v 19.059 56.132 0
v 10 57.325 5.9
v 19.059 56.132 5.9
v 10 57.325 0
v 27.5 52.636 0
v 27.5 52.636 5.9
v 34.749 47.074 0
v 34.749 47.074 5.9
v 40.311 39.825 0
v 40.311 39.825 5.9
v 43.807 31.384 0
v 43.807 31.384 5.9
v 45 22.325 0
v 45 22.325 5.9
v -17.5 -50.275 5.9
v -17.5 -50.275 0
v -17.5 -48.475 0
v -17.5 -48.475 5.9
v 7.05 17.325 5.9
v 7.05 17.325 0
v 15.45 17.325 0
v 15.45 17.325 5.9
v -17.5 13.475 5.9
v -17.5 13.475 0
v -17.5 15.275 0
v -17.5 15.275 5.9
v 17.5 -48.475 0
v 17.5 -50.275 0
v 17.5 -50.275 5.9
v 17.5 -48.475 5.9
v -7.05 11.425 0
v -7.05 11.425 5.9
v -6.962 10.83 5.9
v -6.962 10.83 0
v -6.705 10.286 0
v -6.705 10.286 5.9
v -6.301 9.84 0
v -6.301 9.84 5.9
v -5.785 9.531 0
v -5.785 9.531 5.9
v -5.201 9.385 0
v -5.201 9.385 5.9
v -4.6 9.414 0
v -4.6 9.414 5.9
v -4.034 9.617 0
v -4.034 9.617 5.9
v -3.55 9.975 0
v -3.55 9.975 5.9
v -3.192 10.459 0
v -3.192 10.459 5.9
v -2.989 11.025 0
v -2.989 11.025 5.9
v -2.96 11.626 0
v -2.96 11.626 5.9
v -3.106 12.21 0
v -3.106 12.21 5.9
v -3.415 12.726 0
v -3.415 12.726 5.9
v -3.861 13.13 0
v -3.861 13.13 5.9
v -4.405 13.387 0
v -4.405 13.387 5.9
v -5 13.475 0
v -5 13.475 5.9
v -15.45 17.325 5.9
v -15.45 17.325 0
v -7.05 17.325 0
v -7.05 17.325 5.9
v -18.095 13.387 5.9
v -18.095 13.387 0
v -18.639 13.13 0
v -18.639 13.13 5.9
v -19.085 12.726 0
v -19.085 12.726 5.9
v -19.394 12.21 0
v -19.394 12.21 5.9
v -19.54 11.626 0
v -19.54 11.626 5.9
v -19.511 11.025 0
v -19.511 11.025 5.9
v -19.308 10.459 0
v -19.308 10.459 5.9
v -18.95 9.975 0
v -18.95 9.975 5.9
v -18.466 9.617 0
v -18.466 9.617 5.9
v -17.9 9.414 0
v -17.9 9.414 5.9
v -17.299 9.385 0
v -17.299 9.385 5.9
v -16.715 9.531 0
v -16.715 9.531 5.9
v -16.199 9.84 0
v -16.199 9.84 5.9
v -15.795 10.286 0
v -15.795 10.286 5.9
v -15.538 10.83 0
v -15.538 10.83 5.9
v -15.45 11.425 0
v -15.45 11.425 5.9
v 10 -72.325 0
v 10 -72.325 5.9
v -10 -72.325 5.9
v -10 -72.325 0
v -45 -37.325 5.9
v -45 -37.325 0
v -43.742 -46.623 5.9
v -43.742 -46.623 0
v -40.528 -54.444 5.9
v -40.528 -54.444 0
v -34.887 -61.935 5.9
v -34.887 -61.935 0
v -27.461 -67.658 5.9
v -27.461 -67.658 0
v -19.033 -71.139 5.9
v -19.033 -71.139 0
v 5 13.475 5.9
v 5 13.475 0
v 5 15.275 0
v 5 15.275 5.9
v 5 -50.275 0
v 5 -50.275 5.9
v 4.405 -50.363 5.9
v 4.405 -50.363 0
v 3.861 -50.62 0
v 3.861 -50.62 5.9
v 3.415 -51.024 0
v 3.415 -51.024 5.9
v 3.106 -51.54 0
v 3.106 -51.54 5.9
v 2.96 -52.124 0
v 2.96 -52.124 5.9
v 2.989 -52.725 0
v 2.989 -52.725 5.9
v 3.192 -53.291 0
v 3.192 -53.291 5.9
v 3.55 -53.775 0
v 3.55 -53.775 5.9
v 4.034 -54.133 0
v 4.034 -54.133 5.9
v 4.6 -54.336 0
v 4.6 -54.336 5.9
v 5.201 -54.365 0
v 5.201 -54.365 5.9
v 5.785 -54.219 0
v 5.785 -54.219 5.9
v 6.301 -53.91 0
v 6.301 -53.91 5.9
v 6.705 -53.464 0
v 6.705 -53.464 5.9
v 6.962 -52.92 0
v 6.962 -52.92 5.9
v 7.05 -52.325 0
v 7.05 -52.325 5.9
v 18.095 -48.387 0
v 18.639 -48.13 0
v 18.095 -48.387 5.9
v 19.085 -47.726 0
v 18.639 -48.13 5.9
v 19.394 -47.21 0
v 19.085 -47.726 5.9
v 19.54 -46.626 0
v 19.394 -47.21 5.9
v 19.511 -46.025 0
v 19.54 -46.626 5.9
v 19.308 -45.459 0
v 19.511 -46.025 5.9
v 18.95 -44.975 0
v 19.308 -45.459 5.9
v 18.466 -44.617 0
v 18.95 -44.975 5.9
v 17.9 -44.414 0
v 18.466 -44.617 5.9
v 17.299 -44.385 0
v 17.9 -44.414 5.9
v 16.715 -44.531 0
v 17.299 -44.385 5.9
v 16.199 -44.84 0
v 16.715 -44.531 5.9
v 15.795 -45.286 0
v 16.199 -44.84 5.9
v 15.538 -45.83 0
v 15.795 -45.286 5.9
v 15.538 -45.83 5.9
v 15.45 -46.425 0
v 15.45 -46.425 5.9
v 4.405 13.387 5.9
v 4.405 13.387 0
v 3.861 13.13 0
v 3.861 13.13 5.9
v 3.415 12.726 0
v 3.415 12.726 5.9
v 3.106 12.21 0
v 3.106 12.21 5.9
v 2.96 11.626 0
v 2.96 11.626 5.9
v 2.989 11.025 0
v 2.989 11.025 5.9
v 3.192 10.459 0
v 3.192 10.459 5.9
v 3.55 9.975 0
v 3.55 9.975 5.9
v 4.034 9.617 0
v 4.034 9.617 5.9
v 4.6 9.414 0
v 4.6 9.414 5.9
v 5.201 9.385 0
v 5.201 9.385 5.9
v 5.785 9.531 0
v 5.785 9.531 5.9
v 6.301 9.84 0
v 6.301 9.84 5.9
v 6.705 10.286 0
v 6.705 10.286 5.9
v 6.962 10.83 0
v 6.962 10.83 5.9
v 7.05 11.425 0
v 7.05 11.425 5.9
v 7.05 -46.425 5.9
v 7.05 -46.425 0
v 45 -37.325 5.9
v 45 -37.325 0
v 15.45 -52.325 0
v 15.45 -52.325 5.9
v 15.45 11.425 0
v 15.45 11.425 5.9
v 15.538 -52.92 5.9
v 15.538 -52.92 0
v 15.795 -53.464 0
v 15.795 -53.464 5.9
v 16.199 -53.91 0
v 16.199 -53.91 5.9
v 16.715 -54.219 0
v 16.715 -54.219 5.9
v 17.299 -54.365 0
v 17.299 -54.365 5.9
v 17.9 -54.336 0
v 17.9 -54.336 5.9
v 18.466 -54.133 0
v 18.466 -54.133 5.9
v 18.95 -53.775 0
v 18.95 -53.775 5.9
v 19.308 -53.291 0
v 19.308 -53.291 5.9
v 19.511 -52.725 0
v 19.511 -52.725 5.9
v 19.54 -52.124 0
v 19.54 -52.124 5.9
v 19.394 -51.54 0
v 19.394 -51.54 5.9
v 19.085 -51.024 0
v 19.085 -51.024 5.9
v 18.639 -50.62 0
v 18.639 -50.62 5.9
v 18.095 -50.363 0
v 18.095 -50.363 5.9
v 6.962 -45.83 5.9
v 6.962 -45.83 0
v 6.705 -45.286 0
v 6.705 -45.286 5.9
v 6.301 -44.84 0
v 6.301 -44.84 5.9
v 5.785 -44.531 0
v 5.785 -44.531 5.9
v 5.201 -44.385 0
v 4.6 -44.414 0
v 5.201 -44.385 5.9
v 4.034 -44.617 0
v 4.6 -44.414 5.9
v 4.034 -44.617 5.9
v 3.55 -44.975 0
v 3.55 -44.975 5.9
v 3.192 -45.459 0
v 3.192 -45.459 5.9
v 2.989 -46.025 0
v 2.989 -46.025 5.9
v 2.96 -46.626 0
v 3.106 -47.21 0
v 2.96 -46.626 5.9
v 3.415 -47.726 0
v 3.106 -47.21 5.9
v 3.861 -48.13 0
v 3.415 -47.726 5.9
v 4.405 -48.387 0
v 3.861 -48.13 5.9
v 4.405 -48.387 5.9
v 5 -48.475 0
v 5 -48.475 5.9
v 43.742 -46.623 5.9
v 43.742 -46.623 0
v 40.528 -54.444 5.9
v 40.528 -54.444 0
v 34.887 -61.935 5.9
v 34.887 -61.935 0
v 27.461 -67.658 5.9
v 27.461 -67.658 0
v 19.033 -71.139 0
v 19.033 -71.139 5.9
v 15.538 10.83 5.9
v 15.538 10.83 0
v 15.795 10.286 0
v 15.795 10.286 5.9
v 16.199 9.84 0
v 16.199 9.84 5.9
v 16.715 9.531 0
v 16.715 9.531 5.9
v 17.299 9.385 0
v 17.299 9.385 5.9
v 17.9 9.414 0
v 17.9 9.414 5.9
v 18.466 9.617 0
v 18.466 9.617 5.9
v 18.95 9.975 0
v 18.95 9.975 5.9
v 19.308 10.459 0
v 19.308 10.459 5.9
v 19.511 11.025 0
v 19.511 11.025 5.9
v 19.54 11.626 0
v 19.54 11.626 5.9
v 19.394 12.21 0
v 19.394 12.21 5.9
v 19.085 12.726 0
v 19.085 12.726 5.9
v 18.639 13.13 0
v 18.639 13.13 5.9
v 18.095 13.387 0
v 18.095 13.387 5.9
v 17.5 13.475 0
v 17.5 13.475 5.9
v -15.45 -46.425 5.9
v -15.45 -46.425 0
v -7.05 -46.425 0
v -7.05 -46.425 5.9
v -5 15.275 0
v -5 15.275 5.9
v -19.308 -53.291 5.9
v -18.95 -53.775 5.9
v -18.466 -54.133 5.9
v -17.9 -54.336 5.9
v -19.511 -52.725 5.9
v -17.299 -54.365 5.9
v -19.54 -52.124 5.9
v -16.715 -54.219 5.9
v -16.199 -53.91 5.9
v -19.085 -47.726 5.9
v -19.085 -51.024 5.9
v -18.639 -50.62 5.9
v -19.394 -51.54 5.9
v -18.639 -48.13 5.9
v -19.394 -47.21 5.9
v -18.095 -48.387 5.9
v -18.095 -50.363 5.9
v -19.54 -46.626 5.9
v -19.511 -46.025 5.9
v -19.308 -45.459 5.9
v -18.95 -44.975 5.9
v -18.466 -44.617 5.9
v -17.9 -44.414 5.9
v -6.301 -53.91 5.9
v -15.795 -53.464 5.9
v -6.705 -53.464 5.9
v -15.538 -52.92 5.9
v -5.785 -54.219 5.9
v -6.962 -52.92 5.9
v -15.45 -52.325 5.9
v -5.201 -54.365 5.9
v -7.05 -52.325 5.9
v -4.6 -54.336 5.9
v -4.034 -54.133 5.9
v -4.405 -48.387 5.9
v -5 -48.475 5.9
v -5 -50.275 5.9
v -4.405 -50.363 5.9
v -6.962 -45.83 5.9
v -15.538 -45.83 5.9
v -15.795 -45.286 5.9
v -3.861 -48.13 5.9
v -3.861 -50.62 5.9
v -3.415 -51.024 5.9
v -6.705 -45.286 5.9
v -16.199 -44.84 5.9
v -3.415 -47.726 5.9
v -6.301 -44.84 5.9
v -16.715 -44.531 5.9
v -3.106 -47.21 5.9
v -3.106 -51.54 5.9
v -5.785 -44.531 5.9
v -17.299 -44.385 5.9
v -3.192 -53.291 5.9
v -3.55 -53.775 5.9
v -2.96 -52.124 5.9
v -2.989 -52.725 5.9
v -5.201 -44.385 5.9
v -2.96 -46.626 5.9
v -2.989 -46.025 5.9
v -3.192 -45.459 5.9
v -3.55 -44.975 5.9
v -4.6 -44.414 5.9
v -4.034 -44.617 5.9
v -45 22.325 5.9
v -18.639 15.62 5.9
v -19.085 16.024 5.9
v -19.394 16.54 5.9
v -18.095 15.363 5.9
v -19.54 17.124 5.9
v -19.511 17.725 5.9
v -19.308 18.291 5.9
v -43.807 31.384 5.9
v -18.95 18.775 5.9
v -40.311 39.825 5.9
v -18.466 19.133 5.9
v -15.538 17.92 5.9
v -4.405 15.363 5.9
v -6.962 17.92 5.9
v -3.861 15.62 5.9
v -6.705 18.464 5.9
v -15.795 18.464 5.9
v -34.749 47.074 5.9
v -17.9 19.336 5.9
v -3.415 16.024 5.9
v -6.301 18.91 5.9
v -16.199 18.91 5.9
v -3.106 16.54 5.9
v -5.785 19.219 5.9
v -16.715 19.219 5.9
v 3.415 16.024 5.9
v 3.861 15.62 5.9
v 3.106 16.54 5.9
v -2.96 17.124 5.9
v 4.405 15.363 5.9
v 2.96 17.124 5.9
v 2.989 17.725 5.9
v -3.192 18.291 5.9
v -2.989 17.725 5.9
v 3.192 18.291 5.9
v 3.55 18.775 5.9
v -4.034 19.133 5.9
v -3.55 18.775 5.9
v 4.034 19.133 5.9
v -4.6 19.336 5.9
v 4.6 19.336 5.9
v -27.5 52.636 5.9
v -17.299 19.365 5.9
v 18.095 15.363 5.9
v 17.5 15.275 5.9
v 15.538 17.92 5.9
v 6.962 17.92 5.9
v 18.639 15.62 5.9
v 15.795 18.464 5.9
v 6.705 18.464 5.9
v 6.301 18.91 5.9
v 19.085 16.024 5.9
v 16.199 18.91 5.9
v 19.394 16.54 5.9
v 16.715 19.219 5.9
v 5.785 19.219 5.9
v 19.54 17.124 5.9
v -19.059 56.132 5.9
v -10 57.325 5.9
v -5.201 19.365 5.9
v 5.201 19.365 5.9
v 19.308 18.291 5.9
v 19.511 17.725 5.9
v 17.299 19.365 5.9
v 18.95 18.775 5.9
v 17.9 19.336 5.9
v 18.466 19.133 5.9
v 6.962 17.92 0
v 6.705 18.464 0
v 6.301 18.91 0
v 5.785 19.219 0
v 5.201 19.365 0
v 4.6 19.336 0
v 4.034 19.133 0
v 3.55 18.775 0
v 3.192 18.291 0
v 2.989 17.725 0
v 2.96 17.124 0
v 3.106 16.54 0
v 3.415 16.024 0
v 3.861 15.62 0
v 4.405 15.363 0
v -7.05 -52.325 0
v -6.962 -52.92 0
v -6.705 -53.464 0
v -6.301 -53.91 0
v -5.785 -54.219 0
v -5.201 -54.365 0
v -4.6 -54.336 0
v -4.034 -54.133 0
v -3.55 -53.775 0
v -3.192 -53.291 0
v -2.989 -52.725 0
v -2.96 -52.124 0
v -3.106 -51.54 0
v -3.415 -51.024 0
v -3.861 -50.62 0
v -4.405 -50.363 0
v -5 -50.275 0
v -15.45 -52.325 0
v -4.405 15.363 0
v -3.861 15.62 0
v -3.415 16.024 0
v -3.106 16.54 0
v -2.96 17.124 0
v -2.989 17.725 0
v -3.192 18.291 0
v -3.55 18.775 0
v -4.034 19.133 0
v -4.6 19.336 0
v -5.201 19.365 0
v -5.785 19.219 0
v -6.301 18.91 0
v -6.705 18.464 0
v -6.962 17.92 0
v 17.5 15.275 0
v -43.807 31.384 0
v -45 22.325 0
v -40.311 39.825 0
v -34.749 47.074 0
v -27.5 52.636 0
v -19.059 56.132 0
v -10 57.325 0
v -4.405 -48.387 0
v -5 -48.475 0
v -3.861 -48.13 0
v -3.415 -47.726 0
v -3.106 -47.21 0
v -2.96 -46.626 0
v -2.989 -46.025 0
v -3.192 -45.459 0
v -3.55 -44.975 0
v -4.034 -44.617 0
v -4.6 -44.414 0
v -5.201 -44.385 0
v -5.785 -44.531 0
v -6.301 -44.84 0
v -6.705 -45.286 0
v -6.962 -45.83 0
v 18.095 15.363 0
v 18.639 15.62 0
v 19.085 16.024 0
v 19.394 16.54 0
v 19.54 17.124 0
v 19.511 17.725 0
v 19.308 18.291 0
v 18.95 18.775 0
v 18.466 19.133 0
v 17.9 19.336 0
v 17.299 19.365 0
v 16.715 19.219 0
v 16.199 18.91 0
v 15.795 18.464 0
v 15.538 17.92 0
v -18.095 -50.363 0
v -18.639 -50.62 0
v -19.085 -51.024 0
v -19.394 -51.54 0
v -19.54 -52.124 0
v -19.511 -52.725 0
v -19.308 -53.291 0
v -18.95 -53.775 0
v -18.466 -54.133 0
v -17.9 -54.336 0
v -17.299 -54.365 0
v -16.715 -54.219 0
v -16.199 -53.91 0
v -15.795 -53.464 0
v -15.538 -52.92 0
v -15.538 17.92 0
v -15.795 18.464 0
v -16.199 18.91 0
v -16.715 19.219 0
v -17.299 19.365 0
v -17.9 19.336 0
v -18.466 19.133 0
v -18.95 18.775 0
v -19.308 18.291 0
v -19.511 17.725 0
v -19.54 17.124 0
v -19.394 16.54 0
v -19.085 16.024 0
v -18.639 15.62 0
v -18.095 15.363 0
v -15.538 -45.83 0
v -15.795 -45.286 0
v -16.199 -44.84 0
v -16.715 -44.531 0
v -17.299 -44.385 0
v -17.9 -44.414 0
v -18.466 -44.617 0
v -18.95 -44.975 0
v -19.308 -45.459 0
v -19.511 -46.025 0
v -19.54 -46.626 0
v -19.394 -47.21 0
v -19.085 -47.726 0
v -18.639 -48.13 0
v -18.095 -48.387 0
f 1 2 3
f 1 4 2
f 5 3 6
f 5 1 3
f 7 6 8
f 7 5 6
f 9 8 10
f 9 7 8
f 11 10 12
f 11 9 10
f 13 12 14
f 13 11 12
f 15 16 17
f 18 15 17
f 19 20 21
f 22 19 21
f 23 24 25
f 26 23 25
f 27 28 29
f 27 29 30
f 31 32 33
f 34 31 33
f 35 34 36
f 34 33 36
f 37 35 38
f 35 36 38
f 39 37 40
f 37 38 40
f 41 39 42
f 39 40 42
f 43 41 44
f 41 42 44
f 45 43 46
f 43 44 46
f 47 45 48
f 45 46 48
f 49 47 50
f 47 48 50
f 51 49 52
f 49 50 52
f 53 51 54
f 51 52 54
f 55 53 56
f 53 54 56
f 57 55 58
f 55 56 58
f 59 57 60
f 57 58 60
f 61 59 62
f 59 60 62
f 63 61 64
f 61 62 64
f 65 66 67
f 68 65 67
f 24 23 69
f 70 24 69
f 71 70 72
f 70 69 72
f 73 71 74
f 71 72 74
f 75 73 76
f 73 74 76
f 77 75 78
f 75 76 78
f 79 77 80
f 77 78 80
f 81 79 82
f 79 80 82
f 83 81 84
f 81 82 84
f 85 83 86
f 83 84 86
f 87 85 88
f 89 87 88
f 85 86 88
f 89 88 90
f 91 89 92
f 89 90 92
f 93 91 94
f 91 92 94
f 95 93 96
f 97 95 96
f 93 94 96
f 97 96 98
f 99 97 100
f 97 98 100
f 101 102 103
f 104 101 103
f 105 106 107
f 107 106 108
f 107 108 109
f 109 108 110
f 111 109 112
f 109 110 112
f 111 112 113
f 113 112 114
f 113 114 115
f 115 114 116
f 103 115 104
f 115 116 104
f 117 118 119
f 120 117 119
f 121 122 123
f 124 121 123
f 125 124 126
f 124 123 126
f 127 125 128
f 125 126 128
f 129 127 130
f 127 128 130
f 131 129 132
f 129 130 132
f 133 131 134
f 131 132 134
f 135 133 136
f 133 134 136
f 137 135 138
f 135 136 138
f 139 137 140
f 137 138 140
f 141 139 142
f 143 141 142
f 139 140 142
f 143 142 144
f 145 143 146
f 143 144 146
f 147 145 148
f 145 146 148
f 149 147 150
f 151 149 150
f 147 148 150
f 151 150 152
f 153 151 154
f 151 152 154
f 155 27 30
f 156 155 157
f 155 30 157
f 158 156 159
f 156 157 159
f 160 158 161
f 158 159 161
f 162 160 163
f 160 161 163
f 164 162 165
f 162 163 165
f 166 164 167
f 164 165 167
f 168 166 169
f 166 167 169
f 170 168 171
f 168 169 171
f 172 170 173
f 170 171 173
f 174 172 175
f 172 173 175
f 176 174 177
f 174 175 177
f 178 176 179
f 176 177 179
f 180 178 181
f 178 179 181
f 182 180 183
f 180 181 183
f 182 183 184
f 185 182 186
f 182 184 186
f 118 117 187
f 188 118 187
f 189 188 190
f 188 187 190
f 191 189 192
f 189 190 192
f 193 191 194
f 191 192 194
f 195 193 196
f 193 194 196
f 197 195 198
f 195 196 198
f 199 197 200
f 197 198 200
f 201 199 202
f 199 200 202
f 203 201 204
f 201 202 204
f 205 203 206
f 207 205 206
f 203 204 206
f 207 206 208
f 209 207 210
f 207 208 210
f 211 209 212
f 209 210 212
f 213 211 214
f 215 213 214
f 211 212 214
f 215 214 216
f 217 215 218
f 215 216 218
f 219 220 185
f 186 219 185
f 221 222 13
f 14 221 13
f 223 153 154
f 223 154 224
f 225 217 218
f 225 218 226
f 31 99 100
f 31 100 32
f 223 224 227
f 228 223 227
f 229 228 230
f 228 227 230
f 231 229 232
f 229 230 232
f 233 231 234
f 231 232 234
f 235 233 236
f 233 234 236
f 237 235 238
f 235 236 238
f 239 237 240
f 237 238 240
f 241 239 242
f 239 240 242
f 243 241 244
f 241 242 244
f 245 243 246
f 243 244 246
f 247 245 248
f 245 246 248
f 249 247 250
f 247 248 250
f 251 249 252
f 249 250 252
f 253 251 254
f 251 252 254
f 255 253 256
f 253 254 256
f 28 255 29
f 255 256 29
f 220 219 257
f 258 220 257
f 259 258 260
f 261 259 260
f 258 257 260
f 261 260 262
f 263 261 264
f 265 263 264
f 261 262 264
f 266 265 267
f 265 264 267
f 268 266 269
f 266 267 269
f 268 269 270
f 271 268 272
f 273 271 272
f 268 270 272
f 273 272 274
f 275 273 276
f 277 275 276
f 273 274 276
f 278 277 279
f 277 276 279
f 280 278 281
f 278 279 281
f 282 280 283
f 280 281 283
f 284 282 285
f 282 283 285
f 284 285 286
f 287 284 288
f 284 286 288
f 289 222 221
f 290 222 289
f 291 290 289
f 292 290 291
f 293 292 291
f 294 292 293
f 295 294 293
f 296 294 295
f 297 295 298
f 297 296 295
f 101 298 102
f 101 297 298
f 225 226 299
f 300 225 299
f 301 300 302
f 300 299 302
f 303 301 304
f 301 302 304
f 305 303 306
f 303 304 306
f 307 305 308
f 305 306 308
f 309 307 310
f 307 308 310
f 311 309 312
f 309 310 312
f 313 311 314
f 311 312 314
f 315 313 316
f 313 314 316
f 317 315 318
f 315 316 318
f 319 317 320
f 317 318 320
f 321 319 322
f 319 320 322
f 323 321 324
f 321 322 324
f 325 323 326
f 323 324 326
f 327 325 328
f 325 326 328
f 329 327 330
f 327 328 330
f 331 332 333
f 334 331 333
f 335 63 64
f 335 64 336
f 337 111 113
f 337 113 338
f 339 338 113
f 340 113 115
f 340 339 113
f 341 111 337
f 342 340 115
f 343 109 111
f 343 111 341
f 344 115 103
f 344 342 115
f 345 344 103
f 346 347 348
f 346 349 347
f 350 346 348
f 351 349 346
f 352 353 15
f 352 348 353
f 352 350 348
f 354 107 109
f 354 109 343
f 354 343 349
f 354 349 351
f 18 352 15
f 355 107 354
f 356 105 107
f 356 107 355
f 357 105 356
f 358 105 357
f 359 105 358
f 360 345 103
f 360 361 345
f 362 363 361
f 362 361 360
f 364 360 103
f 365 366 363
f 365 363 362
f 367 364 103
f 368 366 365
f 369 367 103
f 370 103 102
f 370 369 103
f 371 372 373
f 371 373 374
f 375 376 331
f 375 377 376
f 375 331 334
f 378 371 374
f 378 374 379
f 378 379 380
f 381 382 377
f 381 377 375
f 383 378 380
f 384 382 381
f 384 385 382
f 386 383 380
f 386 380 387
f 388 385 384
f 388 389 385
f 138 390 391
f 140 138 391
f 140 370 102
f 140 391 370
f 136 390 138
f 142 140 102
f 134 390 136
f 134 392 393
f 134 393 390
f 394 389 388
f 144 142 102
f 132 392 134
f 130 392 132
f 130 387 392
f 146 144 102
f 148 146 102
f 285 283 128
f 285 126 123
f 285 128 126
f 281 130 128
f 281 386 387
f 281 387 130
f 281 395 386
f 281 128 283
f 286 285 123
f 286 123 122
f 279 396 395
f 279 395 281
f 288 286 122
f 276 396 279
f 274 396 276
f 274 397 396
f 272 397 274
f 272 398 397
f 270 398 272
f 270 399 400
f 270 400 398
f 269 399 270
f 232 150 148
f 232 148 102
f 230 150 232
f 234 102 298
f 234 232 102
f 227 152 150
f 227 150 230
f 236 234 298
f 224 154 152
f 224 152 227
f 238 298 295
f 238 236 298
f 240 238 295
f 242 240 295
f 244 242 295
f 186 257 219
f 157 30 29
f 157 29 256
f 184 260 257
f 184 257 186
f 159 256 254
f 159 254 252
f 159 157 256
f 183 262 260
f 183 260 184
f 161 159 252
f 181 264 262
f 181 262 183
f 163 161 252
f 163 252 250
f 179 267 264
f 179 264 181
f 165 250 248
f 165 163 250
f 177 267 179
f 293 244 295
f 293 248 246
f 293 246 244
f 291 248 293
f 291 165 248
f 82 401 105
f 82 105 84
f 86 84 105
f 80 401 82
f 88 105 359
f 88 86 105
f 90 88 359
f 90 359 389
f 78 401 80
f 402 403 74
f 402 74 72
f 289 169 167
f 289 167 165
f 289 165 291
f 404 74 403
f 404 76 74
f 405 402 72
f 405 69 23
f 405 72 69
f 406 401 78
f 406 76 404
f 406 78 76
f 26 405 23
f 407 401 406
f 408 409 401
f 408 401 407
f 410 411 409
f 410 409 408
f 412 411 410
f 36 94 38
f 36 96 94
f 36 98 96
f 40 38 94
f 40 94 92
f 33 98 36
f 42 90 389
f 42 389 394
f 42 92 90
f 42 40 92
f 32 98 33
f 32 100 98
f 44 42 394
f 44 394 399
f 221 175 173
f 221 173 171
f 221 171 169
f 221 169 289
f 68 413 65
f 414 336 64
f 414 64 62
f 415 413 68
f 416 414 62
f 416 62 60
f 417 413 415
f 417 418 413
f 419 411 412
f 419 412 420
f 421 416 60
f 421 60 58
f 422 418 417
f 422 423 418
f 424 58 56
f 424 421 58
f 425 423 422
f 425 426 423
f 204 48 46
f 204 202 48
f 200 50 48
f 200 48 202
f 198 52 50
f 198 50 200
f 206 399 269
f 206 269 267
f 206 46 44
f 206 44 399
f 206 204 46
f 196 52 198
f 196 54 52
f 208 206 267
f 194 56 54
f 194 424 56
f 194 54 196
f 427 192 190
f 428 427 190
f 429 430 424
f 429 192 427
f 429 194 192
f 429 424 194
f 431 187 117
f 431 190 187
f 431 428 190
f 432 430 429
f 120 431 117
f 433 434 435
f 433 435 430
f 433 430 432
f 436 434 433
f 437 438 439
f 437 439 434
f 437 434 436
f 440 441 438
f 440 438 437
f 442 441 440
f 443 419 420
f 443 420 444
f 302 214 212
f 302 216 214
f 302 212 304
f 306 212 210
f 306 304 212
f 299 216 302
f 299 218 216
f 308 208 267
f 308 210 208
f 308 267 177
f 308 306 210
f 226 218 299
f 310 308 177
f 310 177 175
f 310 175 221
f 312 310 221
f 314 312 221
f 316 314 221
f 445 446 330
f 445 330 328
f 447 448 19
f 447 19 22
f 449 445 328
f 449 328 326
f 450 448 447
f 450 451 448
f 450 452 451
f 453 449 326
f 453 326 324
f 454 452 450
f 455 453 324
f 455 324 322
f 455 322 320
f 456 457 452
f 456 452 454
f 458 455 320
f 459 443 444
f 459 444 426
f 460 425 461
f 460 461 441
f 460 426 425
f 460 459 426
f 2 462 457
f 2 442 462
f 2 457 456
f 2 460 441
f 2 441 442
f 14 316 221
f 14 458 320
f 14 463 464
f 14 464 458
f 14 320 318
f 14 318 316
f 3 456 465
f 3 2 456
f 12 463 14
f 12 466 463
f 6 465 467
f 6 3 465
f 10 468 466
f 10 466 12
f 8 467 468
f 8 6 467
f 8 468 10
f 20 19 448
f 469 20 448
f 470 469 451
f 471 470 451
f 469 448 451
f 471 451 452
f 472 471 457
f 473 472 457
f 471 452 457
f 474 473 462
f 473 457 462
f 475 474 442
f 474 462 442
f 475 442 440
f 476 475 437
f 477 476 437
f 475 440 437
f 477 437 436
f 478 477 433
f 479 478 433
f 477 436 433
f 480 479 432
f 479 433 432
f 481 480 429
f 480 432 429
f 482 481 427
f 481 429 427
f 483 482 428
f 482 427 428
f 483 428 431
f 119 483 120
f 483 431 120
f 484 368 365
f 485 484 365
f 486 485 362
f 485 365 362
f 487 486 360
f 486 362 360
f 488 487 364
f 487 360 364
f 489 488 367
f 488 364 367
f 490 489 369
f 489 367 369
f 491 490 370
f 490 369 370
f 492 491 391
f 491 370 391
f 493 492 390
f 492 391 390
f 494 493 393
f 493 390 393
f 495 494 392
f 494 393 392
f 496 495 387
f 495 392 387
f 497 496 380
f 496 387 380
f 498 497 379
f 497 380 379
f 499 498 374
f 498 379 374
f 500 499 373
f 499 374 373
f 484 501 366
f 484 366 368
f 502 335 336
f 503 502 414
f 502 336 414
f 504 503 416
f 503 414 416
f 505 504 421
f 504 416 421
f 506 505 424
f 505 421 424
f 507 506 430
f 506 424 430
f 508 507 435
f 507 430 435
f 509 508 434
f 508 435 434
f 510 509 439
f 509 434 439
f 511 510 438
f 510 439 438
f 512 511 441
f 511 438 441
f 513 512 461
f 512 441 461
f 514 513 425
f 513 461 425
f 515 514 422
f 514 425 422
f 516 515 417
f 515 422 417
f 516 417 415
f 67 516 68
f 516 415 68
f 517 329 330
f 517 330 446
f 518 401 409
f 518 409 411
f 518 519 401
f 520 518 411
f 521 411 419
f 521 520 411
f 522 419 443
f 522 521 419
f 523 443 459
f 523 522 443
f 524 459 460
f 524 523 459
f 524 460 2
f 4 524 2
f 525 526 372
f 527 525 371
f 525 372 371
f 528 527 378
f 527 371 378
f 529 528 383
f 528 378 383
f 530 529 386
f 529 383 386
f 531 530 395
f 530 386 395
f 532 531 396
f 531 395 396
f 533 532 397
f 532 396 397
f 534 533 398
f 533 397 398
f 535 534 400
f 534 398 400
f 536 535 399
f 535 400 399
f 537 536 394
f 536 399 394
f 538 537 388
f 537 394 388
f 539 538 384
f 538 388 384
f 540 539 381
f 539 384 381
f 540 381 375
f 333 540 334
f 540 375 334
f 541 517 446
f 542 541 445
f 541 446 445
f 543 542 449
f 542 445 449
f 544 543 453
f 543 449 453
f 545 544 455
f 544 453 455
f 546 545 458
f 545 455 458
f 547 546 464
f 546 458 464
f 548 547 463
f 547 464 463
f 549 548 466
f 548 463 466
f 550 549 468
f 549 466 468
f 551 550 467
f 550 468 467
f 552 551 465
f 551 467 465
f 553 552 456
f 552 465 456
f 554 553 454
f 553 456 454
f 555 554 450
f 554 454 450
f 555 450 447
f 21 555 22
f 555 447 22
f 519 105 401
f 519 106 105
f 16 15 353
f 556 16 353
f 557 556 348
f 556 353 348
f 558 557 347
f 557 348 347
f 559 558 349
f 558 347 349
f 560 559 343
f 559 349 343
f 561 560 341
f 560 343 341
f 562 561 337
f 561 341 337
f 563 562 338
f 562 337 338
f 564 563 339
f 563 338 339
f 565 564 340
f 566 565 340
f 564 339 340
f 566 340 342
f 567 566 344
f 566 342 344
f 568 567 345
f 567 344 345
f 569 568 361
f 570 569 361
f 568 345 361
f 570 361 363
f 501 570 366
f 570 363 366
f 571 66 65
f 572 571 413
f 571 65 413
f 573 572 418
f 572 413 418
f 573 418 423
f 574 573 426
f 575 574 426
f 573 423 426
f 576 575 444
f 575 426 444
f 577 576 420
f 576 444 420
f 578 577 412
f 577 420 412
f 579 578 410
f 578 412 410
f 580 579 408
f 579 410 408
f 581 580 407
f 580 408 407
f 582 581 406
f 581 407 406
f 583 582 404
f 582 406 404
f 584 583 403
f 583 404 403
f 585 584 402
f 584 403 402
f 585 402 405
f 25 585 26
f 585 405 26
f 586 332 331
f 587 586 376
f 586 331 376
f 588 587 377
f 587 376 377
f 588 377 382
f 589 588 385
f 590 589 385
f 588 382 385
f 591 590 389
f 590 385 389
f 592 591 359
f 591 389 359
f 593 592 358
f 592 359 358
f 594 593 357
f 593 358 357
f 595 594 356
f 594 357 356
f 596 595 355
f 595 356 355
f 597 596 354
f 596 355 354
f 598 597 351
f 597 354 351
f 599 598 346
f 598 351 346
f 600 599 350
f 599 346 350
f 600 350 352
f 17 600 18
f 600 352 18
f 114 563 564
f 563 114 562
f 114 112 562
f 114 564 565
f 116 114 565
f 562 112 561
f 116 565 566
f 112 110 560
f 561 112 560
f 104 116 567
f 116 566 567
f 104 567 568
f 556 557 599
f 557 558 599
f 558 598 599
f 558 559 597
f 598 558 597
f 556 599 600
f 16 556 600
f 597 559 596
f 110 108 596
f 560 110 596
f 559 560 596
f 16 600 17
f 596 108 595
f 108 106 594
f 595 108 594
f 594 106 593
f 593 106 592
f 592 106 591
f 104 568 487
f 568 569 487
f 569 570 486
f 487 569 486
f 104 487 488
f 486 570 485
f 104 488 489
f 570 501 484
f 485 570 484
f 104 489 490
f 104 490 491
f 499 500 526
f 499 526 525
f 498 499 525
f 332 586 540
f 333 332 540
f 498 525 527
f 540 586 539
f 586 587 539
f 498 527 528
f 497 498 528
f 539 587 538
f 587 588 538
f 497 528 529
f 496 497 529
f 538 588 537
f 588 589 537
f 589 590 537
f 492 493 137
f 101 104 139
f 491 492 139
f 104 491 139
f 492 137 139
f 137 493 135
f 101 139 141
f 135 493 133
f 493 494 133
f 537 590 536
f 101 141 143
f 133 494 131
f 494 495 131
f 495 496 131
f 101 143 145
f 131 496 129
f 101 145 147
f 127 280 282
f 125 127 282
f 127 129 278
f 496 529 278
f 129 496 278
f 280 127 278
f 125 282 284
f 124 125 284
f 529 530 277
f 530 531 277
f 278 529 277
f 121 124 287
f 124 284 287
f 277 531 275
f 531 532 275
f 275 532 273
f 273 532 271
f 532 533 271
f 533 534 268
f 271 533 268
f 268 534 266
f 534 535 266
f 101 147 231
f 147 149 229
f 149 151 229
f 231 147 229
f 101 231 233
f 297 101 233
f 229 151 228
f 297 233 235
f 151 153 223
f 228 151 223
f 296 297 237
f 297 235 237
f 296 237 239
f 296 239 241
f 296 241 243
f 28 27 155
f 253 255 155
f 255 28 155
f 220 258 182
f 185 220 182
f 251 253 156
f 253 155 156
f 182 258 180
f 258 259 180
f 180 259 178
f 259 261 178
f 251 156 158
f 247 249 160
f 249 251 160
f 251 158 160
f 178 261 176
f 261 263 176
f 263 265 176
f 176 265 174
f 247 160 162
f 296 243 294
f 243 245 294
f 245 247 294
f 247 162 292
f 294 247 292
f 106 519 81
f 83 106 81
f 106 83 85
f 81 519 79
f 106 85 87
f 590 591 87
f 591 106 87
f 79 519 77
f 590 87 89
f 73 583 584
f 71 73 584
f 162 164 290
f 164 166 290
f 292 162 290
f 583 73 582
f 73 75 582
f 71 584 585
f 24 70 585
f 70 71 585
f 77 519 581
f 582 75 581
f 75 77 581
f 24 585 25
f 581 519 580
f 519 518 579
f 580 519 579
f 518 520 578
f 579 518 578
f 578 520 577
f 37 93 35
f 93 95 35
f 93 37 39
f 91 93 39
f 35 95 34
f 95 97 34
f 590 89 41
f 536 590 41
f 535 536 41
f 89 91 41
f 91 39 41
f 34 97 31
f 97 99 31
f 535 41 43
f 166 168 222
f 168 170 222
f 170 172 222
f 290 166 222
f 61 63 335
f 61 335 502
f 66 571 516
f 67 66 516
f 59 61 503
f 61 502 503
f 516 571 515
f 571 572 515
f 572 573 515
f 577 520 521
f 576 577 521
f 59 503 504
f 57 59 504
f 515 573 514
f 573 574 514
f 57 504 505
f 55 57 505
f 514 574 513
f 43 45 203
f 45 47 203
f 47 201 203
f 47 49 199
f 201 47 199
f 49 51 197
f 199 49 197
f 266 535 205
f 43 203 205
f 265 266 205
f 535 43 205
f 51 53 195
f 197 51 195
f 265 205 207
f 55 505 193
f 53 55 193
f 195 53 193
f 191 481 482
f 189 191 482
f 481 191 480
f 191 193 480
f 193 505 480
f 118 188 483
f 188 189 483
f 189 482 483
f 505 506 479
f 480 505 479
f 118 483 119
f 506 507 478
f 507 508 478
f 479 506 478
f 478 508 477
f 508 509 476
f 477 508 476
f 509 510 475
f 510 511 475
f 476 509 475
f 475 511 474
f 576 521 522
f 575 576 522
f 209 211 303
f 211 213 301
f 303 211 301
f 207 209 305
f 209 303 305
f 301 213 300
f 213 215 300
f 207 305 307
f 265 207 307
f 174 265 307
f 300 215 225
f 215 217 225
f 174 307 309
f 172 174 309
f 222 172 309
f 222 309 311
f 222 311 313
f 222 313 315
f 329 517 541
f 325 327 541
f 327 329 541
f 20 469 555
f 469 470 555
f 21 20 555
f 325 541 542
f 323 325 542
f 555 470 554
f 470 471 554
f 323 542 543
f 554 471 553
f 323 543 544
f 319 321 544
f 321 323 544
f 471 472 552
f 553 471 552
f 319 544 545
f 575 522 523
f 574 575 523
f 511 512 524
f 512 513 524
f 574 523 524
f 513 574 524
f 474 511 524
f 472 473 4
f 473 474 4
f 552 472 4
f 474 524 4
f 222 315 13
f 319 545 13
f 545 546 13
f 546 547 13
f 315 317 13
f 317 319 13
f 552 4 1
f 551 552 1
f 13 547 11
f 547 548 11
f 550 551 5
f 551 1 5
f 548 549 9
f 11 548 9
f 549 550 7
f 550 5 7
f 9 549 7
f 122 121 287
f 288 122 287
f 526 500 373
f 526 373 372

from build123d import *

# Parameters (mm, degrees)
SKETCH1_W           = 90
SKETCH1_H           = 154.65
SKETCH1_W_2         = 12.5
SKETCH1_H_2         = 5.9
BOSS_EXTRUDE1_DEPTH = 5.9
FILLET2_R           = 10
BOSS_EXTRUDE2_DEPTH = 5.9
CUT_EXTRUDE1_REACH  = 7.9
SKETCH5_R           = 2.05
CUT_EXTRUDE4_REACH  = 7.9
FILLET3_R           = 35


with BuildPart() as part:
    # Sketch1 → Boss-Extrude1 (new body)
    with BuildSketch(Plane.XY):
        Rectangle(SKETCH1_W, SKETCH1_H)
        with Locations((-11.25, 14.375)):
            Rectangle(SKETCH1_W_2, SKETCH1_H_2, mode=Mode.SUBTRACT)
        with Locations((11.25, 14.375)):
            Rectangle(SKETCH1_W_2, SKETCH1_H_2, mode=Mode.SUBTRACT)
        with Locations((11.25, -49.375)):
            Rectangle(SKETCH1_W_2, SKETCH1_H_2, mode=Mode.SUBTRACT)
        with Locations((-11.25, -49.375)):
            Rectangle(SKETCH1_W_2, SKETCH1_H_2, mode=Mode.SUBTRACT)
    extrude(amount=BOSS_EXTRUDE1_DEPTH)

    # Fillet2
    fillet2_edges = [part.edges().sort_by_distance(p)[0] for p in [
        (45, -77.325, 2.95),
        (-45, -77.325, 2.95),
        (-45, 77.325, 2.95),
        (45, 77.325, 2.95),
    ]]
    fillet(fillet2_edges, radius=FILLET2_R)

    # Sketch2 → Boss-Extrude2 (add)
    with BuildSketch(Plane.XY.offset(5.9)):
        Polygon((24.6, -77.325), (-24.6, -77.325), (-10, -90.939292058), (-10, -103.239292058), (-4.5, -119.325), (4.5, -119.325), (10, -103.239292058), (10, -90.939292058), align=None)
        with BuildLine():
            Line((-45, 67.325), (-45, 53.482347581))
            Line((-45, 53.482347581), (0, 77.325))
            ThreePointArc((0, 77.325), (-4.9039074, 78.609973195), (-8.547536888, 82.134661558))
            Line((-8.547536888, 82.134661558), (-15.653395136, 93.836708769))
            Line((-15.653395136, 93.836708769), (-36.605205168, 117.74389141))
            Line((-36.605205168, 117.74389141), (-44.297988367, 113.072586812))
            Line((-44.297988367, 113.072586812), (-38.587949383, 93.072586812))
            Line((-38.587949383, 93.072586812), (-31.970396029, 80.241759725))
            ThreePointArc((-31.970396029, 80.241759725), (-32.040056415, 78.284211705), (-33.747908787, 77.325))
            Line((-33.747908787, 77.325), (-35, 77.325))
            ThreePointArc((-35, 77.325), (-42.071067812, 74.396067812), (-45, 67.325))
        make_face()
        with BuildLine():
            ThreePointArc((8.547536888, 82.134661558), (4.9039074, 78.609973195), (0, 77.325))
            Line((0, 77.325), (45, 53.482347581))
            Line((45, 53.482347581), (45, 67.325))
            ThreePointArc((45, 67.325), (42.071067812, 74.396067812), (35, 77.325))
            Line((35, 77.325), (33.747908787, 77.325))
            ThreePointArc((33.747908787, 77.325), (32.040056415, 78.284211705), (31.970396029, 80.241759725))
            Line((31.970396029, 80.241759725), (38.587949383, 93.072586812))
            Line((38.587949383, 93.072586812), (44.297988367, 113.072586812))
            Line((44.297988367, 113.072586812), (36.605205168, 117.74389141))
            Line((36.605205168, 117.74389141), (15.653395136, 93.836708769))
            Line((15.653395136, 93.836708769), (8.547536888, 82.134661558))
        make_face()
    extrude(amount=-BOSS_EXTRUDE2_DEPTH)

    # Sketch5 → Cut-Extrude1 (cut, up to next)
    with BuildSketch(Plane.XY.offset(5.9), mode=Mode.PRIVATE) as cut_extrude1_sk1:
        with Locations((-17.5, 11.425)):
            Circle(SKETCH5_R)
    cut_extrude1_tool1 = extrude(cut_extrude1_sk1.sketch, amount=-CUT_EXTRUDE1_REACH, mode=Mode.PRIVATE) & part.part
    add(cut_extrude1_tool1.solids().sort_by_distance((-17.5, 11.425, 5.9))[0], mode=Mode.SUBTRACT)
    # Sketch5 → Cut-Extrude1 (cut, up to next)
    with BuildSketch(Plane.XY.offset(5.9), mode=Mode.PRIVATE) as cut_extrude1_sk2:
        with Locations((-5, 11.425)):
            Circle(SKETCH5_R)
    cut_extrude1_tool2 = extrude(cut_extrude1_sk2.sketch, amount=-CUT_EXTRUDE1_REACH, mode=Mode.PRIVATE) & part.part
    add(cut_extrude1_tool2.solids().sort_by_distance((-5, 11.425, 5.9))[0], mode=Mode.SUBTRACT)
    # Sketch5 → Cut-Extrude1 (cut, up to next)
    with BuildSketch(Plane.XY.offset(5.9), mode=Mode.PRIVATE) as cut_extrude1_sk3:
        with Locations((-5, 17.325)):
            Circle(SKETCH5_R)
    cut_extrude1_tool3 = extrude(cut_extrude1_sk3.sketch, amount=-CUT_EXTRUDE1_REACH, mode=Mode.PRIVATE) & part.part
    add(cut_extrude1_tool3.solids().sort_by_distance((-5, 17.325, 5.9))[0], mode=Mode.SUBTRACT)
    # Sketch5 → Cut-Extrude1 (cut, up to next)
    with BuildSketch(Plane.XY.offset(5.9), mode=Mode.PRIVATE) as cut_extrude1_sk4:
        with Locations((-17.5, 17.325)):
            Circle(SKETCH5_R)
    cut_extrude1_tool4 = extrude(cut_extrude1_sk4.sketch, amount=-CUT_EXTRUDE1_REACH, mode=Mode.PRIVATE) & part.part
    add(cut_extrude1_tool4.solids().sort_by_distance((-17.5, 17.325, 5.9))[0], mode=Mode.SUBTRACT)
    # Sketch5 → Cut-Extrude1 (cut, up to next)
    with BuildSketch(Plane.XY.offset(5.9), mode=Mode.PRIVATE) as cut_extrude1_sk5:
        with Locations((17.5, 11.425)):
            Circle(SKETCH5_R)
    cut_extrude1_tool5 = extrude(cut_extrude1_sk5.sketch, amount=-CUT_EXTRUDE1_REACH, mode=Mode.PRIVATE) & part.part
    add(cut_extrude1_tool5.solids().sort_by_distance((17.5, 11.425, 5.9))[0], mode=Mode.SUBTRACT)
    # Sketch5 → Cut-Extrude1 (cut, up to next)
    with BuildSketch(Plane.XY.offset(5.9), mode=Mode.PRIVATE) as cut_extrude1_sk6:
        with Locations((17.5, 17.325)):
            Circle(SKETCH5_R)
    cut_extrude1_tool6 = extrude(cut_extrude1_sk6.sketch, amount=-CUT_EXTRUDE1_REACH, mode=Mode.PRIVATE) & part.part
    add(cut_extrude1_tool6.solids().sort_by_distance((17.5, 17.325, 5.9))[0], mode=Mode.SUBTRACT)
    # Sketch5 → Cut-Extrude1 (cut, up to next)
    with BuildSketch(Plane.XY.offset(5.9), mode=Mode.PRIVATE) as cut_extrude1_sk7:
        with Locations((5, 17.325)):
            Circle(SKETCH5_R)
    cut_extrude1_tool7 = extrude(cut_extrude1_sk7.sketch, amount=-CUT_EXTRUDE1_REACH, mode=Mode.PRIVATE) & part.part
    add(cut_extrude1_tool7.solids().sort_by_distance((5, 17.325, 5.9))[0], mode=Mode.SUBTRACT)
    # Sketch5 → Cut-Extrude1 (cut, up to next)
    with BuildSketch(Plane.XY.offset(5.9), mode=Mode.PRIVATE) as cut_extrude1_sk8:
        with Locations((5, 11.425)):
            Circle(SKETCH5_R)
    cut_extrude1_tool8 = extrude(cut_extrude1_sk8.sketch, amount=-CUT_EXTRUDE1_REACH, mode=Mode.PRIVATE) & part.part
    add(cut_extrude1_tool8.solids().sort_by_distance((5, 11.425, 5.9))[0], mode=Mode.SUBTRACT)
    # Sketch5 → Cut-Extrude1 (cut, up to next)
    with BuildSketch(Plane.XY.offset(5.9), mode=Mode.PRIVATE) as cut_extrude1_sk9:
        with Locations((5, -52.325)):
            Circle(SKETCH5_R)
    cut_extrude1_tool9 = extrude(cut_extrude1_sk9.sketch, amount=-CUT_EXTRUDE1_REACH, mode=Mode.PRIVATE) & part.part
    add(cut_extrude1_tool9.solids().sort_by_distance((5, -52.325, 5.9))[0], mode=Mode.SUBTRACT)
    # Sketch5 → Cut-Extrude1 (cut, up to next)
    with BuildSketch(Plane.XY.offset(5.9), mode=Mode.PRIVATE) as cut_extrude1_sk10:
        with Locations((17.5, -52.325)):
            Circle(SKETCH5_R)
    cut_extrude1_tool10 = extrude(cut_extrude1_sk10.sketch, amount=-CUT_EXTRUDE1_REACH, mode=Mode.PRIVATE) & part.part
    add(cut_extrude1_tool10.solids().sort_by_distance((17.5, -52.325, 5.9))[0], mode=Mode.SUBTRACT)
    # Sketch5 → Cut-Extrude1 (cut, up to next)
    with BuildSketch(Plane.XY.offset(5.9), mode=Mode.PRIVATE) as cut_extrude1_sk11:
        with Locations((17.5, -46.425)):
            Circle(SKETCH5_R)
    cut_extrude1_tool11 = extrude(cut_extrude1_sk11.sketch, amount=-CUT_EXTRUDE1_REACH, mode=Mode.PRIVATE) & part.part
    add(cut_extrude1_tool11.solids().sort_by_distance((17.5, -46.425, 5.9))[0], mode=Mode.SUBTRACT)
    # Sketch5 → Cut-Extrude1 (cut, up to next)
    with BuildSketch(Plane.XY.offset(5.9), mode=Mode.PRIVATE) as cut_extrude1_sk12:
        with Locations((5, -46.425)):
            Circle(SKETCH5_R)
    cut_extrude1_tool12 = extrude(cut_extrude1_sk12.sketch, amount=-CUT_EXTRUDE1_REACH, mode=Mode.PRIVATE) & part.part
    add(cut_extrude1_tool12.solids().sort_by_distance((5, -46.425, 5.9))[0], mode=Mode.SUBTRACT)
    # Sketch5 → Cut-Extrude1 (cut, up to next)
    with BuildSketch(Plane.XY.offset(5.9), mode=Mode.PRIVATE) as cut_extrude1_sk13:
        with Locations((-5, -46.425)):
            Circle(SKETCH5_R)
    cut_extrude1_tool13 = extrude(cut_extrude1_sk13.sketch, amount=-CUT_EXTRUDE1_REACH, mode=Mode.PRIVATE) & part.part
    add(cut_extrude1_tool13.solids().sort_by_distance((-5, -46.425, 5.9))[0], mode=Mode.SUBTRACT)
    # Sketch5 → Cut-Extrude1 (cut, up to next)
    with BuildSketch(Plane.XY.offset(5.9), mode=Mode.PRIVATE) as cut_extrude1_sk14:
        with Locations((-5, -52.325)):
            Circle(SKETCH5_R)
    cut_extrude1_tool14 = extrude(cut_extrude1_sk14.sketch, amount=-CUT_EXTRUDE1_REACH, mode=Mode.PRIVATE) & part.part
    add(cut_extrude1_tool14.solids().sort_by_distance((-5, -52.325, 5.9))[0], mode=Mode.SUBTRACT)
    # Sketch5 → Cut-Extrude1 (cut, up to next)
    with BuildSketch(Plane.XY.offset(5.9), mode=Mode.PRIVATE) as cut_extrude1_sk15:
        with Locations((-17.5, -52.325)):
            Circle(SKETCH5_R)
    cut_extrude1_tool15 = extrude(cut_extrude1_sk15.sketch, amount=-CUT_EXTRUDE1_REACH, mode=Mode.PRIVATE) & part.part
    add(cut_extrude1_tool15.solids().sort_by_distance((-17.5, -52.325, 5.9))[0], mode=Mode.SUBTRACT)
    # Sketch5 → Cut-Extrude1 (cut, up to next)
    with BuildSketch(Plane.XY.offset(5.9), mode=Mode.PRIVATE) as cut_extrude1_sk16:
        with Locations((-17.5, -46.425)):
            Circle(SKETCH5_R)
    cut_extrude1_tool16 = extrude(cut_extrude1_sk16.sketch, amount=-CUT_EXTRUDE1_REACH, mode=Mode.PRIVATE) & part.part
    add(cut_extrude1_tool16.solids().sort_by_distance((-17.5, -46.425, 5.9))[0], mode=Mode.SUBTRACT)

    # Sketch7 → Cut-Extrude4 (cut, up to next)
    with BuildSketch(Plane.XY.offset(5.9), mode=Mode.PRIVATE) as cut_extrude4_sk1:
        with BuildLine():
            Line((-45, 67.325), (-45, 57.325))
            Line((-45, 57.325), (45, 57.325))
            Line((45, 57.325), (45, 67.325))
            ThreePointArc((45, 67.325), (42.071067812, 74.396067812), (35, 77.325))
            Line((35, 77.325), (33.747908787, 77.325))
            ThreePointArc((33.747908787, 77.325), (32.040056415, 78.284211705), (31.970396029, 80.241759725))
            Line((31.970396029, 80.241759725), (38.587949383, 93.072586812))
            Line((38.587949383, 93.072586812), (44.297988367, 113.072586812))
            Line((44.297988367, 113.072586812), (36.605205168, 117.74389141))
            Line((36.605205168, 117.74389141), (15.653395136, 93.836708769))
            Line((15.653395136, 93.836708769), (8.547536888, 82.134661558))
            ThreePointArc((8.547536888, 82.134661558), (0, 77.325), (-8.547536888, 82.134661558))
            Line((-8.547536888, 82.134661558), (-15.653395136, 93.836708769))
            Line((-15.653395136, 93.836708769), (-36.605205168, 117.74389141))
            Line((-36.605205168, 117.74389141), (-44.297988367, 113.072586812))
            Line((-44.297988367, 113.072586812), (-38.587949383, 93.072586812))
            Line((-38.587949383, 93.072586812), (-31.970396029, 80.241759725))
            ThreePointArc((-31.970396029, 80.241759725), (-32.040056415, 78.284211705), (-33.747908787, 77.325))
            Line((-33.747908787, 77.325), (-35, 77.325))
            ThreePointArc((-35, 77.325), (-42.071067812, 74.396067812), (-45, 67.325))
        make_face()
    cut_extrude4_tool1 = extrude(cut_extrude4_sk1.sketch, amount=-CUT_EXTRUDE4_REACH, mode=Mode.PRIVATE) & part.part
    add(cut_extrude4_tool1.solids().sort_by_distance((-34.373954, 76.241005, 5.9))[0], mode=Mode.SUBTRACT)
    # Sketch7 → Cut-Extrude4 (cut, up to next)
    with BuildSketch(Plane.XY.offset(5.9), mode=Mode.PRIVATE) as cut_extrude4_sk2:
        with BuildLine():
            Line((43.660254038, -72.325), (-43.660254038, -72.325))
            ThreePointArc((-43.660254038, -72.325), (-40, -75.985254038), (-35, -77.325))
            Line((-35, -77.325), (-24.6, -77.325))
            Line((-24.6, -77.325), (-10, -90.939292058))
            Line((-10, -90.939292058), (-10, -103.239292058))
            Line((-10, -103.239292058), (-4.5, -119.325))
            Line((-4.5, -119.325), (4.5, -119.325))
            Line((4.5, -119.325), (10, -103.239292058))
            Line((10, -103.239292058), (10, -90.939292058))
            Line((10, -90.939292058), (24.6, -77.325))
            Line((24.6, -77.325), (35, -77.325))
            ThreePointArc((35, -77.325), (40, -75.985254038), (43.660254038, -72.325))
        make_face()
    cut_extrude4_tool2 = extrude(cut_extrude4_sk2.sketch, amount=-CUT_EXTRUDE4_REACH, mode=Mode.PRIVATE) & part.part
    add(cut_extrude4_tool2.solids().sort_by_distance((0, -87.785653, 5.9))[0], mode=Mode.SUBTRACT)

    # Fillet3
    fillet3_edges = [part.edges().sort_by_distance(p)[0] for p in [
        (43.660254038, -72.325, 2.95),
        (-43.660254038, -72.325, 2.95),
        (45, 57.325, 2.95),
        (-45, 57.325, 2.95),
    ]]
    fillet(fillet3_edges, radius=FILLET3_R)


solid = part.part
